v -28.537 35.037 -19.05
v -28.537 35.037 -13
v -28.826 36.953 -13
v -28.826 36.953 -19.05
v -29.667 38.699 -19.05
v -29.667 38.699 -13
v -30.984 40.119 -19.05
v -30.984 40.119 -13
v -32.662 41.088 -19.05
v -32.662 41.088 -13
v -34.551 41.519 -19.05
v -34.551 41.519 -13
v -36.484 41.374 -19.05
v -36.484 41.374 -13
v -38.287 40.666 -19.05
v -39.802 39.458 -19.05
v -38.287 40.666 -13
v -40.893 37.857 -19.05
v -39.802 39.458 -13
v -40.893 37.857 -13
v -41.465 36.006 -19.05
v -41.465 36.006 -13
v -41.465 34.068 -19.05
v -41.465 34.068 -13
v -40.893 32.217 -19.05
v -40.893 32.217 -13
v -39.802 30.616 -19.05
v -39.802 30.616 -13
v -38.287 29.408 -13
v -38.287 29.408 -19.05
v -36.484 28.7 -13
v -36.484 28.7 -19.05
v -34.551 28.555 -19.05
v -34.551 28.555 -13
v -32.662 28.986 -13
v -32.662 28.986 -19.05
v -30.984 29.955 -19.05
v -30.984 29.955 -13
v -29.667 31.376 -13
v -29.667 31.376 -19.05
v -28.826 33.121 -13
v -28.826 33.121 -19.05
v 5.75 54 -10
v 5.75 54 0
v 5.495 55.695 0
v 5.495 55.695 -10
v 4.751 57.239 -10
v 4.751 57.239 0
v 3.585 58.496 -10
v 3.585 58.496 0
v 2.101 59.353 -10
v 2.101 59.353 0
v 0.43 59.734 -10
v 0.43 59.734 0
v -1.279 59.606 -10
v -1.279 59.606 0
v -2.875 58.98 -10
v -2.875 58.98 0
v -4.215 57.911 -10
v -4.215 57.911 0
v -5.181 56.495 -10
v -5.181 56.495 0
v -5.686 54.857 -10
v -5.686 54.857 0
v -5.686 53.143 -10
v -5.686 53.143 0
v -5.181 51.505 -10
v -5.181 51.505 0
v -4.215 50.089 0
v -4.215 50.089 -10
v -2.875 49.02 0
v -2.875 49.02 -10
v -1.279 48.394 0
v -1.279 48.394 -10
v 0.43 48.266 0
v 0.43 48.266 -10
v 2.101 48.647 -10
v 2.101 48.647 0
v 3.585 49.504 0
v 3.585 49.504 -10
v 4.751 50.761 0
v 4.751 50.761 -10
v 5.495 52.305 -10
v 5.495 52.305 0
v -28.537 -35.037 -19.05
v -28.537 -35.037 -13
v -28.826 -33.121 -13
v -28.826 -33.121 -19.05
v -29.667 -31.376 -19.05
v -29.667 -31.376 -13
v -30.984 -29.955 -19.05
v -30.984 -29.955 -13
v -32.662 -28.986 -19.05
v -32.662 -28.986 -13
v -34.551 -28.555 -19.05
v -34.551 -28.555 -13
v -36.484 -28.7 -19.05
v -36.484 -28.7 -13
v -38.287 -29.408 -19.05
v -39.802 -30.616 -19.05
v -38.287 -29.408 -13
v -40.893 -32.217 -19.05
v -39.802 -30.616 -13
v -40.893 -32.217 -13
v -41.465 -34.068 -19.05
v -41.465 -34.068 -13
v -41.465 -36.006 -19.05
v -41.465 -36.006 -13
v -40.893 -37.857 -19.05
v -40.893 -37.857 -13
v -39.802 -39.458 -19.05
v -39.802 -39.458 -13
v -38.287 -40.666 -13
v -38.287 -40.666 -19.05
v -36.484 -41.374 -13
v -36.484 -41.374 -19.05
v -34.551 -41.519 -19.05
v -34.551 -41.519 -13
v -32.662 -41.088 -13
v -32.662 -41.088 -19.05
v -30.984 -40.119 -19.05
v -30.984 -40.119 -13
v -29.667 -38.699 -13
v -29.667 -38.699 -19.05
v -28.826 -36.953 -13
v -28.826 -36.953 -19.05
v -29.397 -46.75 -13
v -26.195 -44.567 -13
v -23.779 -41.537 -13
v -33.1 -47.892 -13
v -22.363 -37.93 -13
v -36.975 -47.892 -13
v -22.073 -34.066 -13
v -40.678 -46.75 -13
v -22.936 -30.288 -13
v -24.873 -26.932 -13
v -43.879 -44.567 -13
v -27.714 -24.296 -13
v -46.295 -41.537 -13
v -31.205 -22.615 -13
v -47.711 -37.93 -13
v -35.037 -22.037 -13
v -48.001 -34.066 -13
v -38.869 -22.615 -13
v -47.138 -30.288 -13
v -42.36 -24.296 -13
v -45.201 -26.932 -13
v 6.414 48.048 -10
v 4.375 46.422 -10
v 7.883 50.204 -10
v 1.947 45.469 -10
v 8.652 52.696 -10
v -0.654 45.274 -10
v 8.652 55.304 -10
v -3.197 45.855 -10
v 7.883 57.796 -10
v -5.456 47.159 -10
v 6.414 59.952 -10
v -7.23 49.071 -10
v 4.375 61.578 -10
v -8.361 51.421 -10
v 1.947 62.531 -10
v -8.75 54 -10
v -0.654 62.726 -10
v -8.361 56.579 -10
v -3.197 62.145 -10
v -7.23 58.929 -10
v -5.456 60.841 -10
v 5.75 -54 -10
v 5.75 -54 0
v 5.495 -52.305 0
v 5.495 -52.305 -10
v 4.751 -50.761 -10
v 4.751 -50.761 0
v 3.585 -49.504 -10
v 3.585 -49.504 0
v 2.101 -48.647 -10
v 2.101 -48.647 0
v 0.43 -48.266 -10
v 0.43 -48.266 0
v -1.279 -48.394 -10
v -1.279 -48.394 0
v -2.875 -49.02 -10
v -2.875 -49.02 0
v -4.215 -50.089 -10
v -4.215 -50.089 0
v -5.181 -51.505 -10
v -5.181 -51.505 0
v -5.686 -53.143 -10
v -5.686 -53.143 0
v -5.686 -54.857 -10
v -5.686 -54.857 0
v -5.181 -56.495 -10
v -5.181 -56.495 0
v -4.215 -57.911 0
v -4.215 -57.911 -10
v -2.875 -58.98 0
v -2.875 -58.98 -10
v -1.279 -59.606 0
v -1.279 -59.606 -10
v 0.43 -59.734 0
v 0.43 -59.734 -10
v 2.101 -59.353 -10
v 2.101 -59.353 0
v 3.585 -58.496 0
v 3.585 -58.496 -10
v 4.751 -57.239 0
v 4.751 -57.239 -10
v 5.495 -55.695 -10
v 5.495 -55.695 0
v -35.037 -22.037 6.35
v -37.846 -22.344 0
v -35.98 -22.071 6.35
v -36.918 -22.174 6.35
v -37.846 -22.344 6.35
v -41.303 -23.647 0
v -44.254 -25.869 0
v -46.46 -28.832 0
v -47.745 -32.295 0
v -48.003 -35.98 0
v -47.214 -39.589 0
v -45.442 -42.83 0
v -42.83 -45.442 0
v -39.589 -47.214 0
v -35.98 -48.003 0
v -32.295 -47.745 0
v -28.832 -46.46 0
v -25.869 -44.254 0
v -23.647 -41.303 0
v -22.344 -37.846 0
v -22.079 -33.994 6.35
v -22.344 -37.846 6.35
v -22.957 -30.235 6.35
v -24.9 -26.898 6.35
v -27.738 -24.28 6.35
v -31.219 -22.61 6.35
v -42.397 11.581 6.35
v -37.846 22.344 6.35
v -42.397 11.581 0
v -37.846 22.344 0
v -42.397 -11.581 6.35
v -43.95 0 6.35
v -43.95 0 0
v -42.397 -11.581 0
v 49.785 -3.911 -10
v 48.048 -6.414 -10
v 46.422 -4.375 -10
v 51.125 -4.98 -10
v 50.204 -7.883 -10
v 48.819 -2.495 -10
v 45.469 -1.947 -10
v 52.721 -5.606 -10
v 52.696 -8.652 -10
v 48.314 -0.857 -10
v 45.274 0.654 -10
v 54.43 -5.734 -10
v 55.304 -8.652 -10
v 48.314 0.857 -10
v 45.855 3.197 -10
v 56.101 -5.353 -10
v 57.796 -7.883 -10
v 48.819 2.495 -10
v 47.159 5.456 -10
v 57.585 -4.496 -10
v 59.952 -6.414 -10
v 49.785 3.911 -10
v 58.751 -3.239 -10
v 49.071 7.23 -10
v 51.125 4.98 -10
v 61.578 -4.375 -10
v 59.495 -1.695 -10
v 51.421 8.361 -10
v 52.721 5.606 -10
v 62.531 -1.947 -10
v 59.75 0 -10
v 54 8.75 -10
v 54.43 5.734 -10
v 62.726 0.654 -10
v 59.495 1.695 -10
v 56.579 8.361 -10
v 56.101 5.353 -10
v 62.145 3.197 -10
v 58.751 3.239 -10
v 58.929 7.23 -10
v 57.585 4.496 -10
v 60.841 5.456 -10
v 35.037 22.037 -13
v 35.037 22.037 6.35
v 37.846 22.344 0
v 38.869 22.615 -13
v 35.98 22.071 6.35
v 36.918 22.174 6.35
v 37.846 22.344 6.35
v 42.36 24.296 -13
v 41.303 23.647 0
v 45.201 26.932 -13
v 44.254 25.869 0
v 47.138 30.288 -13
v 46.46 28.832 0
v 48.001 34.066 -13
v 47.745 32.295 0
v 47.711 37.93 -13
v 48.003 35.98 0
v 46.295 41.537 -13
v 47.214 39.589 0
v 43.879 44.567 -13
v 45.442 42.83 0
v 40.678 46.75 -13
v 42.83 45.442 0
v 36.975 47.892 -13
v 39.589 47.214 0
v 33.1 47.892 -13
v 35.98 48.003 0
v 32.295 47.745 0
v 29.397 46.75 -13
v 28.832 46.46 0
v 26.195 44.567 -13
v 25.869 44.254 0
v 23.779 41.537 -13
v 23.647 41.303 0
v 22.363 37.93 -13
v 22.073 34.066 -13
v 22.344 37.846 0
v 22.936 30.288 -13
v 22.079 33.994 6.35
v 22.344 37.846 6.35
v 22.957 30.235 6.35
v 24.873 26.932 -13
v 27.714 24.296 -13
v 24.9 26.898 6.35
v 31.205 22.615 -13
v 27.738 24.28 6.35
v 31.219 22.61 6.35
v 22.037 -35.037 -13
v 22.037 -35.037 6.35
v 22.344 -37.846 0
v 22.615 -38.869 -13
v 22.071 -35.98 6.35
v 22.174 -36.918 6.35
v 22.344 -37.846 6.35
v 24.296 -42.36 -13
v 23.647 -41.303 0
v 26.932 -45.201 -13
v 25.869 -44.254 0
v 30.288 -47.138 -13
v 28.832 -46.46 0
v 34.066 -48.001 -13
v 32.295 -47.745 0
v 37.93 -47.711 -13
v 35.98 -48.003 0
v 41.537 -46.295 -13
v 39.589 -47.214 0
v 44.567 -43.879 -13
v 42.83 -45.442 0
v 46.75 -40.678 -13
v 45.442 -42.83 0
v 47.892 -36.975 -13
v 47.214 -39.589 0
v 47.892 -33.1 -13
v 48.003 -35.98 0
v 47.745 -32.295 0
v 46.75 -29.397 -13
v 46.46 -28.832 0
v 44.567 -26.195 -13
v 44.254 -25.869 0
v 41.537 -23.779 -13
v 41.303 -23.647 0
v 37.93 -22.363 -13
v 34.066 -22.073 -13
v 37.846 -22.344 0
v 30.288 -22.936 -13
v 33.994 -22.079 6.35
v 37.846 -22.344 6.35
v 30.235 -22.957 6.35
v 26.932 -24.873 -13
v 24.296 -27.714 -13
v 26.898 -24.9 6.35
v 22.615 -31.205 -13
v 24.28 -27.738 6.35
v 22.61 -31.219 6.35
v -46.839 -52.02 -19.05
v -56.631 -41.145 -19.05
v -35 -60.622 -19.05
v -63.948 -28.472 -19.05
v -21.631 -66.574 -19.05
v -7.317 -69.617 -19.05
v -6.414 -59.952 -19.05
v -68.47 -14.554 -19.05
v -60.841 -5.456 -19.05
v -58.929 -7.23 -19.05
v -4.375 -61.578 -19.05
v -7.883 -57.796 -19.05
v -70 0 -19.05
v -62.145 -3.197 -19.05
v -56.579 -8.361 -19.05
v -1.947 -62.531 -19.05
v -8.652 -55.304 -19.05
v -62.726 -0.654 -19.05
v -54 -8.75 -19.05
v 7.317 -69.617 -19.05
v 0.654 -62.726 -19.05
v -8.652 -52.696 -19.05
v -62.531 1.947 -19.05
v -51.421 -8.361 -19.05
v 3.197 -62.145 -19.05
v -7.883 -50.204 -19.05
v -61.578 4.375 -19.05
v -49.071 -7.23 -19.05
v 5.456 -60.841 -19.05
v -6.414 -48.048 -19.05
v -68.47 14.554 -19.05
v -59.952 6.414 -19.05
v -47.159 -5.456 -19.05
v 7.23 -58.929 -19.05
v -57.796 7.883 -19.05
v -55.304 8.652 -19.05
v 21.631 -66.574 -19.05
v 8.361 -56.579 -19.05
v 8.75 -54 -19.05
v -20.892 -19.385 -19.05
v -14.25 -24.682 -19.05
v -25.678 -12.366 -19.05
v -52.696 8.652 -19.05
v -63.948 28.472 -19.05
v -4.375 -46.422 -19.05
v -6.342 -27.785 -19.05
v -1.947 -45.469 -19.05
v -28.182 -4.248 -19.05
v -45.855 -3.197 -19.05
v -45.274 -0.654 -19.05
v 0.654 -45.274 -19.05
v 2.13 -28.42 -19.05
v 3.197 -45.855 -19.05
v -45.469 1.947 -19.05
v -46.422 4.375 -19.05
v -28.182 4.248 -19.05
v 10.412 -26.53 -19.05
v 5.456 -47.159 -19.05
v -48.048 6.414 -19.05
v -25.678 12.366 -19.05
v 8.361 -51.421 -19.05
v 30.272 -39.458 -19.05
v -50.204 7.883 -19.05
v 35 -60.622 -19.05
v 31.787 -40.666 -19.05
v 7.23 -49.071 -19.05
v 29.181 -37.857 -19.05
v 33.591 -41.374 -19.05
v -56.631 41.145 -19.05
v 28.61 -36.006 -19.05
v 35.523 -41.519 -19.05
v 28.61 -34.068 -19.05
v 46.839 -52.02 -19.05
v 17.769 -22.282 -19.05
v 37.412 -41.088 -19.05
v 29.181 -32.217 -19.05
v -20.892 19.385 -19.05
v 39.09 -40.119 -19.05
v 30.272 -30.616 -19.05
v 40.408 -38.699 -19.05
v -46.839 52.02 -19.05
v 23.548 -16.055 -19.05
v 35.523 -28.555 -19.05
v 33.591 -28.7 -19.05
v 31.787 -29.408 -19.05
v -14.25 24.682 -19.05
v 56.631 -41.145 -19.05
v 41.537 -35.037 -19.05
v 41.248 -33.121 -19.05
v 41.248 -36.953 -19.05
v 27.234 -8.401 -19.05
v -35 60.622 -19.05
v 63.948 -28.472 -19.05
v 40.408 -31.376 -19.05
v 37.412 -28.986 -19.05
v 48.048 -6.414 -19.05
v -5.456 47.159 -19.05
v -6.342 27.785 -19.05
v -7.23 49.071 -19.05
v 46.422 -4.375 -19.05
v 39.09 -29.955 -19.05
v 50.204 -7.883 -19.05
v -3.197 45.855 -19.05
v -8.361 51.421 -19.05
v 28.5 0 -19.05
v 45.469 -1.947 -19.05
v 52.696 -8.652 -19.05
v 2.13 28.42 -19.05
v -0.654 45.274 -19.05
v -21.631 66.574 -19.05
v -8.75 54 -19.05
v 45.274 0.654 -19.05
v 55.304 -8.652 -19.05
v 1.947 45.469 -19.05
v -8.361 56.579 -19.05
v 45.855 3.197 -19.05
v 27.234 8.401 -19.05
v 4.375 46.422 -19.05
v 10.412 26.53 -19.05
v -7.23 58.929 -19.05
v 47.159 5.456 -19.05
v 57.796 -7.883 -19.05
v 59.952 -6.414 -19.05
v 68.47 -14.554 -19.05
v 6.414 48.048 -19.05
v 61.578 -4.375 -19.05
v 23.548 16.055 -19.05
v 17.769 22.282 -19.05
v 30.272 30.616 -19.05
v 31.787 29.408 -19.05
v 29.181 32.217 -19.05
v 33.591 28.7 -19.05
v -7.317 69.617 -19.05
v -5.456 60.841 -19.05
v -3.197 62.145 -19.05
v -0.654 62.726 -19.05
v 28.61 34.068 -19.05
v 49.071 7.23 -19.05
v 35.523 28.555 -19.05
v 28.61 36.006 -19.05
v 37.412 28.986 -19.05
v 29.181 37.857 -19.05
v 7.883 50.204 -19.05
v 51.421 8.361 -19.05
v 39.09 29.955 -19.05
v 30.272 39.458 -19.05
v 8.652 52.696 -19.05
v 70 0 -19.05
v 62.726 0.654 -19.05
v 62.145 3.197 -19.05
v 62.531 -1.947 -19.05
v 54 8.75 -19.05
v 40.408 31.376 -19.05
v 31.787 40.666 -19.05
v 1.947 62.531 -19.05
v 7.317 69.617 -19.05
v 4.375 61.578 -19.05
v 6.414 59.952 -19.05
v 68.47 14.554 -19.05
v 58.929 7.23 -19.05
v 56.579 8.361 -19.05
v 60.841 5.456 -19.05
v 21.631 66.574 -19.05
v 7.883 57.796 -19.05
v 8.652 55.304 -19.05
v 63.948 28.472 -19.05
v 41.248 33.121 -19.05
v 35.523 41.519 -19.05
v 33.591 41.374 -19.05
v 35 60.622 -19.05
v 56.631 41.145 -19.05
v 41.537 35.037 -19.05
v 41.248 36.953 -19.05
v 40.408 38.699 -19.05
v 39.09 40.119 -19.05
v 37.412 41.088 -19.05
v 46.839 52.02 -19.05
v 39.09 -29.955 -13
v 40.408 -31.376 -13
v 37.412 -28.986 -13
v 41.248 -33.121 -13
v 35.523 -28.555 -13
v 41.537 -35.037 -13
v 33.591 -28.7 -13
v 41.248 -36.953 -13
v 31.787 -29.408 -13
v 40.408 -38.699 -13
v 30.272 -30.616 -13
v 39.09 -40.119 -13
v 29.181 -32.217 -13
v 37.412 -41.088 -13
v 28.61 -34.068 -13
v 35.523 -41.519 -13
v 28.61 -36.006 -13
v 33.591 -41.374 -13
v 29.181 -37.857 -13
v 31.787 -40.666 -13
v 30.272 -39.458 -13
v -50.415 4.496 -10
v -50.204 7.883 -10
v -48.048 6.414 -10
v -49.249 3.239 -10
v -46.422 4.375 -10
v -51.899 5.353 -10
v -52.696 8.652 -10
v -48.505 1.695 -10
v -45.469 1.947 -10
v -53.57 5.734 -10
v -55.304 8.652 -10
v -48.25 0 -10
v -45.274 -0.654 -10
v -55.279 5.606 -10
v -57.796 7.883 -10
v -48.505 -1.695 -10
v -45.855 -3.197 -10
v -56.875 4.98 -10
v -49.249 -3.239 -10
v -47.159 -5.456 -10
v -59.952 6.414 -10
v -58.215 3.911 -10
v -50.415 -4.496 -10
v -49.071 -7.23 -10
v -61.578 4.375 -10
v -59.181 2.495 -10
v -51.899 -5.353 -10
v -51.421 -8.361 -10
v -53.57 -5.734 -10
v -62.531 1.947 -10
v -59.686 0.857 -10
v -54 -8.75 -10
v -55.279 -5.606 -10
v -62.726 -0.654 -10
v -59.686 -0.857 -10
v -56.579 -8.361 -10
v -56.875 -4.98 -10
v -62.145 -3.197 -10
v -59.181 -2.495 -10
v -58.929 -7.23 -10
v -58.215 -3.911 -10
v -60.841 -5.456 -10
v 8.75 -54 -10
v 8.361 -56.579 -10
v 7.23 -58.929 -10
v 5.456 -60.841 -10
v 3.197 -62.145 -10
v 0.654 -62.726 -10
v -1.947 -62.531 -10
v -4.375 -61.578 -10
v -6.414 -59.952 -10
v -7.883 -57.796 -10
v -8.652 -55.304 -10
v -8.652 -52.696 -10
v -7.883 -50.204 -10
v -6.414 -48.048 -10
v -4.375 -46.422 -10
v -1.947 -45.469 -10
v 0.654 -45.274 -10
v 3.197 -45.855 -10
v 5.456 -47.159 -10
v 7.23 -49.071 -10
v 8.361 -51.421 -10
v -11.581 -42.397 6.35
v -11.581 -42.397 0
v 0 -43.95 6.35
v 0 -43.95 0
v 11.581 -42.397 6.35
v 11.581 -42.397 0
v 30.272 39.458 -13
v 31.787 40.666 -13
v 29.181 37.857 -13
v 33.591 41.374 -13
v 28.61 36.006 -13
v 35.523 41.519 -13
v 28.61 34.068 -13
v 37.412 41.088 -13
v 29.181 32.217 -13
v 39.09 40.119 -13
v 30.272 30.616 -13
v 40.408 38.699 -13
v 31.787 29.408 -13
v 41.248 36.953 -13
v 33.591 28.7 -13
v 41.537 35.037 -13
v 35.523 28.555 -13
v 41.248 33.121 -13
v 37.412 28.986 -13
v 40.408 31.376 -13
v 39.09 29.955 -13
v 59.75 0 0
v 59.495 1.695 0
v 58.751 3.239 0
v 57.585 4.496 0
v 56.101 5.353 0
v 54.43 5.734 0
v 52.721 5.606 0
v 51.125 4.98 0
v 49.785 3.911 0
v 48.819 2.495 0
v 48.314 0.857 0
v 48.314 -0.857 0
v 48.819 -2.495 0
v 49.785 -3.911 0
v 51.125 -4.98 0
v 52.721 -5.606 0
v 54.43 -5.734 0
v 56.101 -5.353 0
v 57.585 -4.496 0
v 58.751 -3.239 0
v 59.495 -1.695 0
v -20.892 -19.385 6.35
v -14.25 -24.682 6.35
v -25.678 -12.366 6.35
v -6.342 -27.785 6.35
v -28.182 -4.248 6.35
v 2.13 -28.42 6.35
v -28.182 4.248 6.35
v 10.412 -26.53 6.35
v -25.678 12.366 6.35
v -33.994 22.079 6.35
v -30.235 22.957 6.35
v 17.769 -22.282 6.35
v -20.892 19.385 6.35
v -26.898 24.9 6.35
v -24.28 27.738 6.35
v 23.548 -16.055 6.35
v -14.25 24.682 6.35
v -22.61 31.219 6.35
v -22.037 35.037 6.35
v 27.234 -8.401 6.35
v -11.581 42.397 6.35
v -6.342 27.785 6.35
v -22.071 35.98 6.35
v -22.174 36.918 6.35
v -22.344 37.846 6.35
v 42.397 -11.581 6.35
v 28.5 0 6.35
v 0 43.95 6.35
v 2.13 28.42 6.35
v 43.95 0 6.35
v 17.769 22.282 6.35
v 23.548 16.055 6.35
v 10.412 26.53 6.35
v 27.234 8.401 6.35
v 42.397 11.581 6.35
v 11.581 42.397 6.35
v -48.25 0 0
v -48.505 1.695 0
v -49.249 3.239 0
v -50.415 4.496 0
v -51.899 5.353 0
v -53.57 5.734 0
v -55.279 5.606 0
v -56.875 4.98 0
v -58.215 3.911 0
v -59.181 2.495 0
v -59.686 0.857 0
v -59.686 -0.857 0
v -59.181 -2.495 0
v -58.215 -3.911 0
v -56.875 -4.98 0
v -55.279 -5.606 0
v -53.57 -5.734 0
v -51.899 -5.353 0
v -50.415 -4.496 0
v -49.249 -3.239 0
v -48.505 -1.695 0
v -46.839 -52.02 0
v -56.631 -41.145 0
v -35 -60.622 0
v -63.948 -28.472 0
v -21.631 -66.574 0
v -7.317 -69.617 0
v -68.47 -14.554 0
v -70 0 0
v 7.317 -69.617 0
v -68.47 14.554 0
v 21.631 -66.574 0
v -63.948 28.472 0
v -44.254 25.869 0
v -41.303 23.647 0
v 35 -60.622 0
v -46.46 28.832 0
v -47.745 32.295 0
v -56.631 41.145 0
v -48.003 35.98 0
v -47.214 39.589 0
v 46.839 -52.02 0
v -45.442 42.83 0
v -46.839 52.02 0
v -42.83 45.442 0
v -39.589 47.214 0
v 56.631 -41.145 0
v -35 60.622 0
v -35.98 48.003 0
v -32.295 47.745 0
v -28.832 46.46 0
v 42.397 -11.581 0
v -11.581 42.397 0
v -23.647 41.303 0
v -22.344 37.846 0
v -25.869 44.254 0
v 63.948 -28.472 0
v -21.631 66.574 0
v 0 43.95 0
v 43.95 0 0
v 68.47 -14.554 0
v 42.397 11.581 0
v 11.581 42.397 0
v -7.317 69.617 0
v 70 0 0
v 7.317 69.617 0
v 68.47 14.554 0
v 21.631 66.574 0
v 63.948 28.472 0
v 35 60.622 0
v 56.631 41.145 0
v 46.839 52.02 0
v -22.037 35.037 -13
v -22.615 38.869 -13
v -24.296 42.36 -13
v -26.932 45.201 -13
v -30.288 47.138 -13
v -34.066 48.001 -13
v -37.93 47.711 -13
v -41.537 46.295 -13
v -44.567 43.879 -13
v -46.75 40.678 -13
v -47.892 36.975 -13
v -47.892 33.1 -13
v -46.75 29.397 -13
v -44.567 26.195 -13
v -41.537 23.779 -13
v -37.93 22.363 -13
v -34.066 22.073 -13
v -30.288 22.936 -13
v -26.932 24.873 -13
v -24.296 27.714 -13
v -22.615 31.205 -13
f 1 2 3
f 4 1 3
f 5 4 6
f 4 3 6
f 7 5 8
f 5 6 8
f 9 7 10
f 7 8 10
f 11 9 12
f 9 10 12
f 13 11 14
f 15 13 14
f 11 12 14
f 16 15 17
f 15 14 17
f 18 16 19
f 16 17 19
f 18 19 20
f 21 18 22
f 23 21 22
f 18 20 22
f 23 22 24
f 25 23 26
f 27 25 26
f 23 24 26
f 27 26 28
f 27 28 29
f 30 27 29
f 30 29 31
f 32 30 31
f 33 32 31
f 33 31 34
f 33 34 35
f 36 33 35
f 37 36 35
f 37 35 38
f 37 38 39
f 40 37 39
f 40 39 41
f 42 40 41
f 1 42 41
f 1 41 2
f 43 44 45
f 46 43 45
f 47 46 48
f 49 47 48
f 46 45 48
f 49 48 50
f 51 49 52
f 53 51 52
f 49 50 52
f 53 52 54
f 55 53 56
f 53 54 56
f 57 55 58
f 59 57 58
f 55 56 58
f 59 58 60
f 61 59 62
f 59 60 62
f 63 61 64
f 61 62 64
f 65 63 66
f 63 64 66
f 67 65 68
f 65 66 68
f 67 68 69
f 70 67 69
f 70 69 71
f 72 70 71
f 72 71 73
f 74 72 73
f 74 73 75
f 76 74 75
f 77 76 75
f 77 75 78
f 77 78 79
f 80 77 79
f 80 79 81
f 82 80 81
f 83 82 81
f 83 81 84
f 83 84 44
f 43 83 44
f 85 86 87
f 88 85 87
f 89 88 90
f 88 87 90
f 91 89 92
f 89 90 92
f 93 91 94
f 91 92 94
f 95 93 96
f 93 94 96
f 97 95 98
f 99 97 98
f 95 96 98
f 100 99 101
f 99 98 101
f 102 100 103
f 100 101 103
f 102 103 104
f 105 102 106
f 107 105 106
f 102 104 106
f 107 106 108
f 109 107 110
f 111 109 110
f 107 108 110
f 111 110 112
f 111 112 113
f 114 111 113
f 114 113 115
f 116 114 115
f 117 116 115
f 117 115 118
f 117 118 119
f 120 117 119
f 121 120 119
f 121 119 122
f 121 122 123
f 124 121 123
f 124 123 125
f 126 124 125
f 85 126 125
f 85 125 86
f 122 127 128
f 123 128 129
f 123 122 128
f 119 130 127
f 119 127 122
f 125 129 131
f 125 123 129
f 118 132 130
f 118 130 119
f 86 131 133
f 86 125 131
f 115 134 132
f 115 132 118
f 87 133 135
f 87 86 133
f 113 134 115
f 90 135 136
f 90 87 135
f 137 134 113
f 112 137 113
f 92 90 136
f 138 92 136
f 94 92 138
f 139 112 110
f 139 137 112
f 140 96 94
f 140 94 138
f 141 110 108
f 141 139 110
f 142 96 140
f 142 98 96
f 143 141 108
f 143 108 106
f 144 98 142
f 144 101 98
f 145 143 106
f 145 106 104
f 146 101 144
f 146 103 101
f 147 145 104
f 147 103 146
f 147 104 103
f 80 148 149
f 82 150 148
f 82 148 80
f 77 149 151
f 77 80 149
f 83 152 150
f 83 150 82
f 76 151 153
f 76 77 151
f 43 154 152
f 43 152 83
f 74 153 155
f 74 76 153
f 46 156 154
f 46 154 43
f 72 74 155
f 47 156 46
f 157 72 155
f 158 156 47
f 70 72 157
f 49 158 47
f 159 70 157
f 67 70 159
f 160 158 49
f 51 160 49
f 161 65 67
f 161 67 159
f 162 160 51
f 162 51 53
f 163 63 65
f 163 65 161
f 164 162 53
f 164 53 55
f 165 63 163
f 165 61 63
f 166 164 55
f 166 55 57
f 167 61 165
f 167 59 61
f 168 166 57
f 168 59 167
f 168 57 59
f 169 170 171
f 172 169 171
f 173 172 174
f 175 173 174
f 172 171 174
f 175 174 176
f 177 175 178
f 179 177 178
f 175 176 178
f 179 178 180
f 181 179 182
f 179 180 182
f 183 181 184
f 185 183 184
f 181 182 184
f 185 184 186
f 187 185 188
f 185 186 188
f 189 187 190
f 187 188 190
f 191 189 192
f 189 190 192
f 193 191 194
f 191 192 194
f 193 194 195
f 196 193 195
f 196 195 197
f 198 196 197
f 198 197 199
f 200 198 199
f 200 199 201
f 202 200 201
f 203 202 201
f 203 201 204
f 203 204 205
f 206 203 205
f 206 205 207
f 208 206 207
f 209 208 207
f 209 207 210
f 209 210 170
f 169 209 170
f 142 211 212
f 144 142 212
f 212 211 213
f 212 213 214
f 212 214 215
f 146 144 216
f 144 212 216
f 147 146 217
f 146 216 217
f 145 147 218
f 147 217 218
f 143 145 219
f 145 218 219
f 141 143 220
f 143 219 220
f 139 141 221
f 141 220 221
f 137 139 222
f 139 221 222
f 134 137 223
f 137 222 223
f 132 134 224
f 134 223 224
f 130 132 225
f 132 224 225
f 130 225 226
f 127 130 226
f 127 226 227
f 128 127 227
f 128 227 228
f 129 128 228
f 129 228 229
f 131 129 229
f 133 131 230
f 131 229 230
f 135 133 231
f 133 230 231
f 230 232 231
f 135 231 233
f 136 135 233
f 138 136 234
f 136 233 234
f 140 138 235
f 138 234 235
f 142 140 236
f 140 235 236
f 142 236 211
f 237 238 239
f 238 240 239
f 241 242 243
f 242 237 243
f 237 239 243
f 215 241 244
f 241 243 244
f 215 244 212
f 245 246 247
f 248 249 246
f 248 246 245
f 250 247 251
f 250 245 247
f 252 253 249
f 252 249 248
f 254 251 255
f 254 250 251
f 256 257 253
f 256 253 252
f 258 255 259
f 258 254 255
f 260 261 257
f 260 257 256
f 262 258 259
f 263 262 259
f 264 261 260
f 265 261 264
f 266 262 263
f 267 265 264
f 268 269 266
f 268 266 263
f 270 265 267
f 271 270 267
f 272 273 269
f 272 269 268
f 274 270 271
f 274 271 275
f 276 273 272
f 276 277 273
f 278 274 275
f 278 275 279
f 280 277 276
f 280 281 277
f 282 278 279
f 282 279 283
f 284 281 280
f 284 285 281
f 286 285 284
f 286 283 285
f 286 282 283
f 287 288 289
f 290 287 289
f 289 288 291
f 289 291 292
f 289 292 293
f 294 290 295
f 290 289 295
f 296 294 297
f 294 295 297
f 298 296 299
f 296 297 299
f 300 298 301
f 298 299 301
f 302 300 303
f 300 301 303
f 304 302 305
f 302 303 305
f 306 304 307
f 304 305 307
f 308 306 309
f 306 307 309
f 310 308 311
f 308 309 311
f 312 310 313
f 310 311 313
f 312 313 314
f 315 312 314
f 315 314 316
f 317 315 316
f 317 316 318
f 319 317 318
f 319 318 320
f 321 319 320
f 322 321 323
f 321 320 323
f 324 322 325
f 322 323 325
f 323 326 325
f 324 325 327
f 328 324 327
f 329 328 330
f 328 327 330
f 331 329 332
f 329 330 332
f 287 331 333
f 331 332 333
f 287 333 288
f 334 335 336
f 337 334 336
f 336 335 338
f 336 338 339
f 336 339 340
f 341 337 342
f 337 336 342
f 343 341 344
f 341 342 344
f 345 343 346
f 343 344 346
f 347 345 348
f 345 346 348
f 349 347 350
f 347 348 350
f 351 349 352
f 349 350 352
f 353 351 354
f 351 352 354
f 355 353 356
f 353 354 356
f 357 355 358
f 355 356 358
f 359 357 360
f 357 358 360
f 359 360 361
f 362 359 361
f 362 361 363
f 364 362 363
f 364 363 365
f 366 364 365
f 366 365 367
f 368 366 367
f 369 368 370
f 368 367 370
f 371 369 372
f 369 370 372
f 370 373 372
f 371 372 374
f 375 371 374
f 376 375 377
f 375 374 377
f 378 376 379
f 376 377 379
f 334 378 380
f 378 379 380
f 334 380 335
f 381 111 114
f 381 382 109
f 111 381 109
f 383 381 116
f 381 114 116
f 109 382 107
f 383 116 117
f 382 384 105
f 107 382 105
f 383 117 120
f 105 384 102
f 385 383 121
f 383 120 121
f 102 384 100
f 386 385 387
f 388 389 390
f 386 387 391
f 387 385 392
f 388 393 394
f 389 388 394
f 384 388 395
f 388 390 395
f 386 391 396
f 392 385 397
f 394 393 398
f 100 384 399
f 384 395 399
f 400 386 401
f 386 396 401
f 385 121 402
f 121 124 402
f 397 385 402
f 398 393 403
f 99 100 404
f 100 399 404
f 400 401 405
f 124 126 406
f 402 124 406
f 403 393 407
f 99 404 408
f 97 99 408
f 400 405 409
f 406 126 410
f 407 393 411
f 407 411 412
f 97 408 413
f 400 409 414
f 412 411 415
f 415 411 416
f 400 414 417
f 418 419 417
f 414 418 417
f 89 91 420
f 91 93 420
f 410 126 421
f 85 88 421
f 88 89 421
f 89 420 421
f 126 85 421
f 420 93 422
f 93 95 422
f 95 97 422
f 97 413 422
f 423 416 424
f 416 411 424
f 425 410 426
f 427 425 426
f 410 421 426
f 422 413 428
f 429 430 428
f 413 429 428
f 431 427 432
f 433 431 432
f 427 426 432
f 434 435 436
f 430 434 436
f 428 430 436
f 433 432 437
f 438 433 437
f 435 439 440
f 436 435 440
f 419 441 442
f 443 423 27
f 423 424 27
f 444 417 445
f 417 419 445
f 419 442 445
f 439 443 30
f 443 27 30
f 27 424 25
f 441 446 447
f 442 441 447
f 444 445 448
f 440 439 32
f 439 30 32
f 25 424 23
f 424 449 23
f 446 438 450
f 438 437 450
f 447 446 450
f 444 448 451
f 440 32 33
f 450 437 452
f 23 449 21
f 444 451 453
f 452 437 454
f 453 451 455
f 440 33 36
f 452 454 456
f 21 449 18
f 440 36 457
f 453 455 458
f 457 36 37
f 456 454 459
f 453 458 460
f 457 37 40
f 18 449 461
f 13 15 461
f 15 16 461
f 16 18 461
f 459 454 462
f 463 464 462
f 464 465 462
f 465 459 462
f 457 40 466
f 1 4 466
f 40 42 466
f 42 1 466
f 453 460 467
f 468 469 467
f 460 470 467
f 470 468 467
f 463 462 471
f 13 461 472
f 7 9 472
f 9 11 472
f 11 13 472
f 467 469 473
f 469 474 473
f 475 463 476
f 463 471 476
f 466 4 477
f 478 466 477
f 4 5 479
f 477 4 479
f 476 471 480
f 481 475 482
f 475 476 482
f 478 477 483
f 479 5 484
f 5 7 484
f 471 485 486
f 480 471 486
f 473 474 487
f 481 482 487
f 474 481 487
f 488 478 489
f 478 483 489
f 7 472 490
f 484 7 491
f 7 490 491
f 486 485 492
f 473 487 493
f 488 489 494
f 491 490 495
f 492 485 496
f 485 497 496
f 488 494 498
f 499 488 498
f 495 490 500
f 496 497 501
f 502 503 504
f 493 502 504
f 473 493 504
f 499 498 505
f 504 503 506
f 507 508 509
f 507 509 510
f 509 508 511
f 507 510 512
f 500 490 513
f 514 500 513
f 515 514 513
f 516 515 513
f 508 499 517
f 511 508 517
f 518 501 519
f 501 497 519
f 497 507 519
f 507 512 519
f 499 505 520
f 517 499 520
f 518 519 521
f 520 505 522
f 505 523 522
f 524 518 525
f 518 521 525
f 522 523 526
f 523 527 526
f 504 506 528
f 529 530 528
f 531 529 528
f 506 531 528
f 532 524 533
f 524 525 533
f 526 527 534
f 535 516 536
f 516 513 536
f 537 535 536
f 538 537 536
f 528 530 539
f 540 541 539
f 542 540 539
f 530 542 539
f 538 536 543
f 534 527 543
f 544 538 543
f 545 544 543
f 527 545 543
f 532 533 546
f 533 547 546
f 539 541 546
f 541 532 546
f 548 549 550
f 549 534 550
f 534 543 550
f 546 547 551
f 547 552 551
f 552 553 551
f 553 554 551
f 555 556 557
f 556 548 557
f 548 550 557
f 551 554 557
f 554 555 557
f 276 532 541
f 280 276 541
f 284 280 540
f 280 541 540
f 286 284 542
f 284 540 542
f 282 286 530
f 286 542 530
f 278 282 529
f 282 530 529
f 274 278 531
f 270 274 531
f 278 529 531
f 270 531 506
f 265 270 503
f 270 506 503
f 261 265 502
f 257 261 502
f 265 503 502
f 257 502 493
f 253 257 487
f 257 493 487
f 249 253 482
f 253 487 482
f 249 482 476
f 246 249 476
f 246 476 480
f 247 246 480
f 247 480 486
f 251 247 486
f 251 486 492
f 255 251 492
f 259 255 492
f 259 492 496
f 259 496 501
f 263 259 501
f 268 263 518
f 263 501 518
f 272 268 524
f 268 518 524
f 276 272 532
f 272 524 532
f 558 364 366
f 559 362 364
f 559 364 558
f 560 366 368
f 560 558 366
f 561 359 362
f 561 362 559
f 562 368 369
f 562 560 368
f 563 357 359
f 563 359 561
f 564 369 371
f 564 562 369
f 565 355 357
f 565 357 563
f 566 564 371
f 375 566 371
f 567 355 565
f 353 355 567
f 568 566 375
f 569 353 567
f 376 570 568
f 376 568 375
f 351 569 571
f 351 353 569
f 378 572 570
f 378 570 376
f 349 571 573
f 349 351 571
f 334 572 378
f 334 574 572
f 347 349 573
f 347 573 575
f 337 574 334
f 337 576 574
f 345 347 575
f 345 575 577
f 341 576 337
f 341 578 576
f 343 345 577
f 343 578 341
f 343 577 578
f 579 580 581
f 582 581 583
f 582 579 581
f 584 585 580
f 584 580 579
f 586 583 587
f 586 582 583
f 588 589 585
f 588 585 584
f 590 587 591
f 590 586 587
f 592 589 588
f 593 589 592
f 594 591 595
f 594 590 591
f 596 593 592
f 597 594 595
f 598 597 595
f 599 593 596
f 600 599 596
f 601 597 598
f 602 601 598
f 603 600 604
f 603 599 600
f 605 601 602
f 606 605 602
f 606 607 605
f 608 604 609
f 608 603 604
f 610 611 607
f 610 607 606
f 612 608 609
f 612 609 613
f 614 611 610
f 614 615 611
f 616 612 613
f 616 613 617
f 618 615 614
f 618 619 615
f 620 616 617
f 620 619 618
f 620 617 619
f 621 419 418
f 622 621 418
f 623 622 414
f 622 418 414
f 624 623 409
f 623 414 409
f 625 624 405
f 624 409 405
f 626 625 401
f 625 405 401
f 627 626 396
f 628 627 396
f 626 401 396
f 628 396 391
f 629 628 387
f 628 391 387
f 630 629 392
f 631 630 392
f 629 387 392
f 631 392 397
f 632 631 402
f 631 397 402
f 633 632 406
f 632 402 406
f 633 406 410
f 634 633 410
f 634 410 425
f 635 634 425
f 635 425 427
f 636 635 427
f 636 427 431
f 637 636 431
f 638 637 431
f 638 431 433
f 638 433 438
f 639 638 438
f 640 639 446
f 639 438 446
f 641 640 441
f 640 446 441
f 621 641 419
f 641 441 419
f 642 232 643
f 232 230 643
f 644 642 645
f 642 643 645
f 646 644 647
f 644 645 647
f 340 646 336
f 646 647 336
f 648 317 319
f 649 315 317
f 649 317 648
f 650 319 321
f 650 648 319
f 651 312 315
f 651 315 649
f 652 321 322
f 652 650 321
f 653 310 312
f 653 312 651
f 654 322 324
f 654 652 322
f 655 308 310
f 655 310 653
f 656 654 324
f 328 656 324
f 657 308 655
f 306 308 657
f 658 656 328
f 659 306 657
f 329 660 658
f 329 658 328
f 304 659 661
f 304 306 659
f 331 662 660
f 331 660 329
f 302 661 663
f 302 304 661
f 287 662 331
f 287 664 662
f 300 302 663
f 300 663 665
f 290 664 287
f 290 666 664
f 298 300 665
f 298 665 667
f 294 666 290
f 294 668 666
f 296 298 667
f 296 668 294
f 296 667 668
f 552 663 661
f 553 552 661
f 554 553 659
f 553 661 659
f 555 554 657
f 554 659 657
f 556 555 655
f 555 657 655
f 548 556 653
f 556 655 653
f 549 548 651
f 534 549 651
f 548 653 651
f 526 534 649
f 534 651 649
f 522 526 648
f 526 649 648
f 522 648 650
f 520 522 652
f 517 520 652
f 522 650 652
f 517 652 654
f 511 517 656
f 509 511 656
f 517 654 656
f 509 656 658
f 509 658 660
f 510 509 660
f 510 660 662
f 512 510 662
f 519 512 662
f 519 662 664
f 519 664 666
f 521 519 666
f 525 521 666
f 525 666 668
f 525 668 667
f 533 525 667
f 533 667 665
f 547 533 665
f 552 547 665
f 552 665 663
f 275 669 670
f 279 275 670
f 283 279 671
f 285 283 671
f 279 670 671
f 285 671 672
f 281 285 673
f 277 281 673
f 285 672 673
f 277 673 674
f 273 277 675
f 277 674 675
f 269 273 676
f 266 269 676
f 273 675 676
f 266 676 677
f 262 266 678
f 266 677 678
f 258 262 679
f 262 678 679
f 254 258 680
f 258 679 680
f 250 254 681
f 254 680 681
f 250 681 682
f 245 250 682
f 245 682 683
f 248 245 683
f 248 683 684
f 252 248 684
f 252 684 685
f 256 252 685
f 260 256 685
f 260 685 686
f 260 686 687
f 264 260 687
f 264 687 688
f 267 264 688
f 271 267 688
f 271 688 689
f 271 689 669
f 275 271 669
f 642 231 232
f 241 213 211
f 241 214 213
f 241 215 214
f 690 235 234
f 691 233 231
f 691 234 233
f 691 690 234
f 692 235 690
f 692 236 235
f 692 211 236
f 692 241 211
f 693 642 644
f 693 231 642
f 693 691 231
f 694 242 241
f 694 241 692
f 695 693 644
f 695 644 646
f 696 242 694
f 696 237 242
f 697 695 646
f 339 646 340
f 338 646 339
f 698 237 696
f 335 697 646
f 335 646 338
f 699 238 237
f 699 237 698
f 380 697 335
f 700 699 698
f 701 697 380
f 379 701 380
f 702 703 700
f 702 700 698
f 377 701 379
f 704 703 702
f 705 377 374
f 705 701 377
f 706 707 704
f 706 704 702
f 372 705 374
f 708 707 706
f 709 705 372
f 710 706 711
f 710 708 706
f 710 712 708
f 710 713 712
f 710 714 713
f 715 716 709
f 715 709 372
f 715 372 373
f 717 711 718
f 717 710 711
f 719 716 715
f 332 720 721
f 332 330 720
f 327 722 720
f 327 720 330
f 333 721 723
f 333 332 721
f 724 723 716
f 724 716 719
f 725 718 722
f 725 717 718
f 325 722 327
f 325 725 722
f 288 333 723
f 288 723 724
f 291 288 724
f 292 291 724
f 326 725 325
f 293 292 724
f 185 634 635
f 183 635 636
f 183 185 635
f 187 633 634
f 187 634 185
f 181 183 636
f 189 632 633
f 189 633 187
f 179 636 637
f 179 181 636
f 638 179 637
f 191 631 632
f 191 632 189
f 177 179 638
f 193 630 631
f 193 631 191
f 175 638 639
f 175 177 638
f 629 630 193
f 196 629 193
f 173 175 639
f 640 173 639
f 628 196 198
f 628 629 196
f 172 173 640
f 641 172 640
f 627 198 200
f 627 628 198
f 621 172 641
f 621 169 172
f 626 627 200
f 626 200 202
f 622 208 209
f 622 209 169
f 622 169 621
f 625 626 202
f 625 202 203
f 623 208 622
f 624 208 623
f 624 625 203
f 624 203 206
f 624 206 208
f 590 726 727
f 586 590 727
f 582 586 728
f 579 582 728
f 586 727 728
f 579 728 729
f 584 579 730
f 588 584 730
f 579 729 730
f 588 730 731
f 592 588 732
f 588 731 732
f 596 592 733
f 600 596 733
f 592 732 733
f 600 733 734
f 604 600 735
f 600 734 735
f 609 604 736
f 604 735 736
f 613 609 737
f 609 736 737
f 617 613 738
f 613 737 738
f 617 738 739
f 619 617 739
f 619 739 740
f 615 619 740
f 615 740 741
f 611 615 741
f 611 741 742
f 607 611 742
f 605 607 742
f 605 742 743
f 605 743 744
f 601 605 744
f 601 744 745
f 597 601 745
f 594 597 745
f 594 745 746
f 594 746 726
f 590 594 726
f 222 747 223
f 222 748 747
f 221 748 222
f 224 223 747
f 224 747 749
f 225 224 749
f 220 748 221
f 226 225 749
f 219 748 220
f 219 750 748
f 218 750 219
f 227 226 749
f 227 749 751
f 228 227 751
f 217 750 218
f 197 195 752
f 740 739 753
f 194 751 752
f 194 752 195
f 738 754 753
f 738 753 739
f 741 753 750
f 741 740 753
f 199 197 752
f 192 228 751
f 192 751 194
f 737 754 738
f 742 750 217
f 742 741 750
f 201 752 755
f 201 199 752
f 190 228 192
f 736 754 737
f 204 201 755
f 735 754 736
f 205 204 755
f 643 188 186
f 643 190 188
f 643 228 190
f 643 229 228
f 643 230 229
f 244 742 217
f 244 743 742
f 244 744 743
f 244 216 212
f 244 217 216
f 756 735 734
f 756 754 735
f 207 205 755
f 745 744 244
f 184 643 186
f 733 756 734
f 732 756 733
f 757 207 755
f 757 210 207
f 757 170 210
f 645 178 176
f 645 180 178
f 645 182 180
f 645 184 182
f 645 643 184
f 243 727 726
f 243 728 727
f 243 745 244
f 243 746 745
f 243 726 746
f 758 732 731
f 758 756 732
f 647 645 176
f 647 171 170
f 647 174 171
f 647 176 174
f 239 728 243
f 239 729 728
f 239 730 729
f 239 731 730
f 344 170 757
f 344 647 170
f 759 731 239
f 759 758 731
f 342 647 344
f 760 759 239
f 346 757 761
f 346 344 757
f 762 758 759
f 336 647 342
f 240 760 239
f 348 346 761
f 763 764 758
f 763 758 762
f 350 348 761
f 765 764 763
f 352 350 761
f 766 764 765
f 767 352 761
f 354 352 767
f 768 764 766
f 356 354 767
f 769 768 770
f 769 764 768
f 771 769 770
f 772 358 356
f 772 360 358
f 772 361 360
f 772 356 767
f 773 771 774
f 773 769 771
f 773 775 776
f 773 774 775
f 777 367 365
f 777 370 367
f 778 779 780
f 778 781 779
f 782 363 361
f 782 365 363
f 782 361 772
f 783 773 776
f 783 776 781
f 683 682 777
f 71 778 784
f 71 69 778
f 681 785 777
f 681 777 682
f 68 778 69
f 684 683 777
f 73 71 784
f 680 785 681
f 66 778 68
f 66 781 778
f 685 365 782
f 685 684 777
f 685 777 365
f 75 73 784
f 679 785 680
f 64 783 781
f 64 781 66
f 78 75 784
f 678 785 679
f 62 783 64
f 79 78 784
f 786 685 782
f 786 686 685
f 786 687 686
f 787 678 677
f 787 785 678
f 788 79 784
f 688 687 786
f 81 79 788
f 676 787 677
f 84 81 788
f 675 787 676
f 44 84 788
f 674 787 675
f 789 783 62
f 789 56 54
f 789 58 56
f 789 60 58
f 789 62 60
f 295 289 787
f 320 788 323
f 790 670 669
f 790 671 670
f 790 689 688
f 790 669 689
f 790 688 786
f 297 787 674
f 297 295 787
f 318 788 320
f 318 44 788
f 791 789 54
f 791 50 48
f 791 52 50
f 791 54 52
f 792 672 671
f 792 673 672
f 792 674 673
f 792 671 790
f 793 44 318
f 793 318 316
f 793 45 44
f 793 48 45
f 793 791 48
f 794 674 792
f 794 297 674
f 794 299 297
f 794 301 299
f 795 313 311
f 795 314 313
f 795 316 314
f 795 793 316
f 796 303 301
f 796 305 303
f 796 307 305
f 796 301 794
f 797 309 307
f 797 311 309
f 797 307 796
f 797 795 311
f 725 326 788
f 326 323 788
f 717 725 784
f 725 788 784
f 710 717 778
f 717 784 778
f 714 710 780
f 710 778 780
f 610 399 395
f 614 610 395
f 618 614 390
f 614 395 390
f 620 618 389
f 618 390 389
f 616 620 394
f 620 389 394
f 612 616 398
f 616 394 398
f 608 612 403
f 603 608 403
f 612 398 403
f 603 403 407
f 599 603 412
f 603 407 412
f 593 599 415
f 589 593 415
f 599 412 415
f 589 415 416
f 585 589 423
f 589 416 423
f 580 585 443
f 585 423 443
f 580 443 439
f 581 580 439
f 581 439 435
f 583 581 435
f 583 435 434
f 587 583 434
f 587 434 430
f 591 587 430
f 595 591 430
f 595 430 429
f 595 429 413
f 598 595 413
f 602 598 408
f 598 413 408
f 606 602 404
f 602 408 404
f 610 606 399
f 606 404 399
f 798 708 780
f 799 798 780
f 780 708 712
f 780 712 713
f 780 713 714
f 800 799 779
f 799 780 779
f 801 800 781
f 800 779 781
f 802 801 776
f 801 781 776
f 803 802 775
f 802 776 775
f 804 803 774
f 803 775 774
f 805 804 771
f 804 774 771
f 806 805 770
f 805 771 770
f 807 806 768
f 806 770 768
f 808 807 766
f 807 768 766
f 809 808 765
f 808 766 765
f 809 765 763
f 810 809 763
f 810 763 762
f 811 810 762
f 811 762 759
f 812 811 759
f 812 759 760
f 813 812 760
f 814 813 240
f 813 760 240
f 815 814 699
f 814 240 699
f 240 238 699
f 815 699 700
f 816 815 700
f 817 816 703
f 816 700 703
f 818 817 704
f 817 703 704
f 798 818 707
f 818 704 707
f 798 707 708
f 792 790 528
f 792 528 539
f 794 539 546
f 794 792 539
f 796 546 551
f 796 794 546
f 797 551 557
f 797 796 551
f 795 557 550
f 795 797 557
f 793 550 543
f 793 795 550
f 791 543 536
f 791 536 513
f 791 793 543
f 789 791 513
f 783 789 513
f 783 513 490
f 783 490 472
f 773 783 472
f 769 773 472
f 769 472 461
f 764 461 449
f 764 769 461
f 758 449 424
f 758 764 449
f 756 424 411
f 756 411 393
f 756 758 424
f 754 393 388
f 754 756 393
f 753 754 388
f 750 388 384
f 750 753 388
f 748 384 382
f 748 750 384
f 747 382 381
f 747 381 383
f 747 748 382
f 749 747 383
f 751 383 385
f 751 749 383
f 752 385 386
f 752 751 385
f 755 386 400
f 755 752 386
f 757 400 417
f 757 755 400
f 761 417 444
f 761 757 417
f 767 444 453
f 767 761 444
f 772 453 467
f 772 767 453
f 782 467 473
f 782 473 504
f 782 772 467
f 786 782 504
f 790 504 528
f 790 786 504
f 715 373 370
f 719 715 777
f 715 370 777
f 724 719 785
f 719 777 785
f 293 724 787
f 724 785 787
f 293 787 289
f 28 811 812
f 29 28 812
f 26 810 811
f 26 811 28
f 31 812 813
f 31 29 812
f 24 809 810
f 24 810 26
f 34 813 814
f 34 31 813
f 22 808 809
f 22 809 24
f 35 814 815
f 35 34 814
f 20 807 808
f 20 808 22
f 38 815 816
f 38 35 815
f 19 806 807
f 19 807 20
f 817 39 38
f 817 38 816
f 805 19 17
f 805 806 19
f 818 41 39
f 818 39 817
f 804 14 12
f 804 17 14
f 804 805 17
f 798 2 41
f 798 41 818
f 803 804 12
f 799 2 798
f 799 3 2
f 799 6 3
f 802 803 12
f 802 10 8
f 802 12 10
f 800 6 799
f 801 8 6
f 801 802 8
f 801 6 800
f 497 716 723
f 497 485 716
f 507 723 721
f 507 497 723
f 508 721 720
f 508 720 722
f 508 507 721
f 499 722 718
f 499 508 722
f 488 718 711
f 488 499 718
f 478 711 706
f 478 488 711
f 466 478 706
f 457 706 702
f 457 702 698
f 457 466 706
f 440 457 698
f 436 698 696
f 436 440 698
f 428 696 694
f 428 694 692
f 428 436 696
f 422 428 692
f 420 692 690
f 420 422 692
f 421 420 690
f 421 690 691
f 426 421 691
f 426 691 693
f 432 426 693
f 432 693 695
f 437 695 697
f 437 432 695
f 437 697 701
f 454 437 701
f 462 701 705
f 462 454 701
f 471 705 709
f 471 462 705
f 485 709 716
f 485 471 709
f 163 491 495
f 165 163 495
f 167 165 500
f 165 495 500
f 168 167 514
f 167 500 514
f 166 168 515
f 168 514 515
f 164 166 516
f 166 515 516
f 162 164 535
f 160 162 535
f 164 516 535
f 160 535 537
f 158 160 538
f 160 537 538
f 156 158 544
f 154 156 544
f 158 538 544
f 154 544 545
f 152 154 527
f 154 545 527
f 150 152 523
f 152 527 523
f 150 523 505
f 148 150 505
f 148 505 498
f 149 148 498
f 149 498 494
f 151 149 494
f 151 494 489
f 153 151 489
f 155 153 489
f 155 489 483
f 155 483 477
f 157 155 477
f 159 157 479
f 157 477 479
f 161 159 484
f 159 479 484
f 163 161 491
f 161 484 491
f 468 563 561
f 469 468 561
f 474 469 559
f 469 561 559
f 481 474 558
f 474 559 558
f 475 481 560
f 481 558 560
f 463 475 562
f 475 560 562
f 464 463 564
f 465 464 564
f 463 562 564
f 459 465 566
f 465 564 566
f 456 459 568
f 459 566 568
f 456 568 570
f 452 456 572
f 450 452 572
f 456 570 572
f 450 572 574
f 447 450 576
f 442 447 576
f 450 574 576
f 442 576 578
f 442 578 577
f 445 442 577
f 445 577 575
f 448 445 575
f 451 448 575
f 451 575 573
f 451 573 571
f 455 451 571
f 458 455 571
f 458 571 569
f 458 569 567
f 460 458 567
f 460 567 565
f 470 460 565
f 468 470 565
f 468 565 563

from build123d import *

# Parameters (mm, degrees)
CROQUIS1_R              = 70
CROQUIS1_R_2            = 28.5
CROQUIS1_R_3            = 6.5
CROQUIS1_R_4            = 5.75
SALIENTE_EXTRUIR1_DEPTH = 19.05
CROQUIS2_R              = 43.95
CROQUIS2_R_2            = 28.5
SALIENTE_EXTRUIR2_DEPTH = 6.35
CROQUIS4_R              = 8.75
CORTAR_EXTRUIR1_DEPTH   = 9.05
MATRIZC1_COUNT          = 4
CROQUIS5_R              = 13
CORTAR_EXTRUIR2_DEPTH   = 19.35
MATRIZC2_COUNT          = 4


with BuildPart() as part:
    # Croquis1 → Saliente-Extruir1 (new body)
    with BuildSketch(Plane.XY):
        Circle(CROQUIS1_R)
        Circle(CROQUIS1_R_2, mode=Mode.SUBTRACT)
        with Locations((35.037141008, 35.037141008)):
            Circle(CROQUIS1_R_3, mode=Mode.SUBTRACT)
        with Locations((35.037141008, -35.037141008)):
            Circle(CROQUIS1_R_3, mode=Mode.SUBTRACT)
        with Locations((-35.037141008, -35.037141008)):
            Circle(CROQUIS1_R_3, mode=Mode.SUBTRACT)
        with Locations((-35.037141008, 35.037141008)):
            Circle(CROQUIS1_R_3, mode=Mode.SUBTRACT)
        with Locations((0, 54)):
            Circle(CROQUIS1_R_4, mode=Mode.SUBTRACT)
        with Locations((54, 0)):
            Circle(CROQUIS1_R_4, mode=Mode.SUBTRACT)
        with Locations((0, -54)):
            Circle(CROQUIS1_R_4, mode=Mode.SUBTRACT)
        with Locations((-54, 0)):
            Circle(CROQUIS1_R_4, mode=Mode.SUBTRACT)
    extrude(amount=-SALIENTE_EXTRUIR1_DEPTH)

    # Croquis2 → Saliente-Extruir2 (add)
    with BuildSketch(Plane.XY):
        Circle(CROQUIS2_R)
        Circle(CROQUIS2_R_2, mode=Mode.SUBTRACT)
    extrude(amount=SALIENTE_EXTRUIR2_DEPTH)

    # Croquis4 → Cortar-Extruir1 (cut)
    with BuildSketch(Plane(origin=(0, 0, -19.05), x_dir=(-1, 0, 0), z_dir=(0, 0, -1))):
        with Locations((0, 54)):
            Circle(CROQUIS4_R)
    cortar_extruir1 = extrude(amount=-CORTAR_EXTRUIR1_DEPTH, mode=Mode.SUBTRACT)

    # MatrizC1: Cortar-Extruir1 ×4 about axis
    matrizc1_axis = Axis((0, 0, 0), (0, 0, 1))
    for i in range(1, MATRIZC1_COUNT):
        add(cortar_extruir1.rotate(matrizc1_axis, i * 360 / MATRIZC1_COUNT), mode=Mode.SUBTRACT)

    # Croquis5 → Cortar-Extruir2 (cut)
    with BuildSketch(Plane.XY.offset(6.35)):
        with Locations((-35.037141008, 35.037141008)):
            Circle(CROQUIS5_R)
    cortar_extruir2 = extrude(amount=-CORTAR_EXTRUIR2_DEPTH, mode=Mode.SUBTRACT)

    # MatrizC2: Cortar-Extruir2 ×4 about axis
    matrizc2_axis = Axis((0, 0, 0), (0, 0, 1))
    for i in range(1, MATRIZC2_COUNT):
        add(cortar_extruir2.rotate(matrizc2_axis, i * 360 / MATRIZC2_COUNT), mode=Mode.SUBTRACT)


solid = part.part
